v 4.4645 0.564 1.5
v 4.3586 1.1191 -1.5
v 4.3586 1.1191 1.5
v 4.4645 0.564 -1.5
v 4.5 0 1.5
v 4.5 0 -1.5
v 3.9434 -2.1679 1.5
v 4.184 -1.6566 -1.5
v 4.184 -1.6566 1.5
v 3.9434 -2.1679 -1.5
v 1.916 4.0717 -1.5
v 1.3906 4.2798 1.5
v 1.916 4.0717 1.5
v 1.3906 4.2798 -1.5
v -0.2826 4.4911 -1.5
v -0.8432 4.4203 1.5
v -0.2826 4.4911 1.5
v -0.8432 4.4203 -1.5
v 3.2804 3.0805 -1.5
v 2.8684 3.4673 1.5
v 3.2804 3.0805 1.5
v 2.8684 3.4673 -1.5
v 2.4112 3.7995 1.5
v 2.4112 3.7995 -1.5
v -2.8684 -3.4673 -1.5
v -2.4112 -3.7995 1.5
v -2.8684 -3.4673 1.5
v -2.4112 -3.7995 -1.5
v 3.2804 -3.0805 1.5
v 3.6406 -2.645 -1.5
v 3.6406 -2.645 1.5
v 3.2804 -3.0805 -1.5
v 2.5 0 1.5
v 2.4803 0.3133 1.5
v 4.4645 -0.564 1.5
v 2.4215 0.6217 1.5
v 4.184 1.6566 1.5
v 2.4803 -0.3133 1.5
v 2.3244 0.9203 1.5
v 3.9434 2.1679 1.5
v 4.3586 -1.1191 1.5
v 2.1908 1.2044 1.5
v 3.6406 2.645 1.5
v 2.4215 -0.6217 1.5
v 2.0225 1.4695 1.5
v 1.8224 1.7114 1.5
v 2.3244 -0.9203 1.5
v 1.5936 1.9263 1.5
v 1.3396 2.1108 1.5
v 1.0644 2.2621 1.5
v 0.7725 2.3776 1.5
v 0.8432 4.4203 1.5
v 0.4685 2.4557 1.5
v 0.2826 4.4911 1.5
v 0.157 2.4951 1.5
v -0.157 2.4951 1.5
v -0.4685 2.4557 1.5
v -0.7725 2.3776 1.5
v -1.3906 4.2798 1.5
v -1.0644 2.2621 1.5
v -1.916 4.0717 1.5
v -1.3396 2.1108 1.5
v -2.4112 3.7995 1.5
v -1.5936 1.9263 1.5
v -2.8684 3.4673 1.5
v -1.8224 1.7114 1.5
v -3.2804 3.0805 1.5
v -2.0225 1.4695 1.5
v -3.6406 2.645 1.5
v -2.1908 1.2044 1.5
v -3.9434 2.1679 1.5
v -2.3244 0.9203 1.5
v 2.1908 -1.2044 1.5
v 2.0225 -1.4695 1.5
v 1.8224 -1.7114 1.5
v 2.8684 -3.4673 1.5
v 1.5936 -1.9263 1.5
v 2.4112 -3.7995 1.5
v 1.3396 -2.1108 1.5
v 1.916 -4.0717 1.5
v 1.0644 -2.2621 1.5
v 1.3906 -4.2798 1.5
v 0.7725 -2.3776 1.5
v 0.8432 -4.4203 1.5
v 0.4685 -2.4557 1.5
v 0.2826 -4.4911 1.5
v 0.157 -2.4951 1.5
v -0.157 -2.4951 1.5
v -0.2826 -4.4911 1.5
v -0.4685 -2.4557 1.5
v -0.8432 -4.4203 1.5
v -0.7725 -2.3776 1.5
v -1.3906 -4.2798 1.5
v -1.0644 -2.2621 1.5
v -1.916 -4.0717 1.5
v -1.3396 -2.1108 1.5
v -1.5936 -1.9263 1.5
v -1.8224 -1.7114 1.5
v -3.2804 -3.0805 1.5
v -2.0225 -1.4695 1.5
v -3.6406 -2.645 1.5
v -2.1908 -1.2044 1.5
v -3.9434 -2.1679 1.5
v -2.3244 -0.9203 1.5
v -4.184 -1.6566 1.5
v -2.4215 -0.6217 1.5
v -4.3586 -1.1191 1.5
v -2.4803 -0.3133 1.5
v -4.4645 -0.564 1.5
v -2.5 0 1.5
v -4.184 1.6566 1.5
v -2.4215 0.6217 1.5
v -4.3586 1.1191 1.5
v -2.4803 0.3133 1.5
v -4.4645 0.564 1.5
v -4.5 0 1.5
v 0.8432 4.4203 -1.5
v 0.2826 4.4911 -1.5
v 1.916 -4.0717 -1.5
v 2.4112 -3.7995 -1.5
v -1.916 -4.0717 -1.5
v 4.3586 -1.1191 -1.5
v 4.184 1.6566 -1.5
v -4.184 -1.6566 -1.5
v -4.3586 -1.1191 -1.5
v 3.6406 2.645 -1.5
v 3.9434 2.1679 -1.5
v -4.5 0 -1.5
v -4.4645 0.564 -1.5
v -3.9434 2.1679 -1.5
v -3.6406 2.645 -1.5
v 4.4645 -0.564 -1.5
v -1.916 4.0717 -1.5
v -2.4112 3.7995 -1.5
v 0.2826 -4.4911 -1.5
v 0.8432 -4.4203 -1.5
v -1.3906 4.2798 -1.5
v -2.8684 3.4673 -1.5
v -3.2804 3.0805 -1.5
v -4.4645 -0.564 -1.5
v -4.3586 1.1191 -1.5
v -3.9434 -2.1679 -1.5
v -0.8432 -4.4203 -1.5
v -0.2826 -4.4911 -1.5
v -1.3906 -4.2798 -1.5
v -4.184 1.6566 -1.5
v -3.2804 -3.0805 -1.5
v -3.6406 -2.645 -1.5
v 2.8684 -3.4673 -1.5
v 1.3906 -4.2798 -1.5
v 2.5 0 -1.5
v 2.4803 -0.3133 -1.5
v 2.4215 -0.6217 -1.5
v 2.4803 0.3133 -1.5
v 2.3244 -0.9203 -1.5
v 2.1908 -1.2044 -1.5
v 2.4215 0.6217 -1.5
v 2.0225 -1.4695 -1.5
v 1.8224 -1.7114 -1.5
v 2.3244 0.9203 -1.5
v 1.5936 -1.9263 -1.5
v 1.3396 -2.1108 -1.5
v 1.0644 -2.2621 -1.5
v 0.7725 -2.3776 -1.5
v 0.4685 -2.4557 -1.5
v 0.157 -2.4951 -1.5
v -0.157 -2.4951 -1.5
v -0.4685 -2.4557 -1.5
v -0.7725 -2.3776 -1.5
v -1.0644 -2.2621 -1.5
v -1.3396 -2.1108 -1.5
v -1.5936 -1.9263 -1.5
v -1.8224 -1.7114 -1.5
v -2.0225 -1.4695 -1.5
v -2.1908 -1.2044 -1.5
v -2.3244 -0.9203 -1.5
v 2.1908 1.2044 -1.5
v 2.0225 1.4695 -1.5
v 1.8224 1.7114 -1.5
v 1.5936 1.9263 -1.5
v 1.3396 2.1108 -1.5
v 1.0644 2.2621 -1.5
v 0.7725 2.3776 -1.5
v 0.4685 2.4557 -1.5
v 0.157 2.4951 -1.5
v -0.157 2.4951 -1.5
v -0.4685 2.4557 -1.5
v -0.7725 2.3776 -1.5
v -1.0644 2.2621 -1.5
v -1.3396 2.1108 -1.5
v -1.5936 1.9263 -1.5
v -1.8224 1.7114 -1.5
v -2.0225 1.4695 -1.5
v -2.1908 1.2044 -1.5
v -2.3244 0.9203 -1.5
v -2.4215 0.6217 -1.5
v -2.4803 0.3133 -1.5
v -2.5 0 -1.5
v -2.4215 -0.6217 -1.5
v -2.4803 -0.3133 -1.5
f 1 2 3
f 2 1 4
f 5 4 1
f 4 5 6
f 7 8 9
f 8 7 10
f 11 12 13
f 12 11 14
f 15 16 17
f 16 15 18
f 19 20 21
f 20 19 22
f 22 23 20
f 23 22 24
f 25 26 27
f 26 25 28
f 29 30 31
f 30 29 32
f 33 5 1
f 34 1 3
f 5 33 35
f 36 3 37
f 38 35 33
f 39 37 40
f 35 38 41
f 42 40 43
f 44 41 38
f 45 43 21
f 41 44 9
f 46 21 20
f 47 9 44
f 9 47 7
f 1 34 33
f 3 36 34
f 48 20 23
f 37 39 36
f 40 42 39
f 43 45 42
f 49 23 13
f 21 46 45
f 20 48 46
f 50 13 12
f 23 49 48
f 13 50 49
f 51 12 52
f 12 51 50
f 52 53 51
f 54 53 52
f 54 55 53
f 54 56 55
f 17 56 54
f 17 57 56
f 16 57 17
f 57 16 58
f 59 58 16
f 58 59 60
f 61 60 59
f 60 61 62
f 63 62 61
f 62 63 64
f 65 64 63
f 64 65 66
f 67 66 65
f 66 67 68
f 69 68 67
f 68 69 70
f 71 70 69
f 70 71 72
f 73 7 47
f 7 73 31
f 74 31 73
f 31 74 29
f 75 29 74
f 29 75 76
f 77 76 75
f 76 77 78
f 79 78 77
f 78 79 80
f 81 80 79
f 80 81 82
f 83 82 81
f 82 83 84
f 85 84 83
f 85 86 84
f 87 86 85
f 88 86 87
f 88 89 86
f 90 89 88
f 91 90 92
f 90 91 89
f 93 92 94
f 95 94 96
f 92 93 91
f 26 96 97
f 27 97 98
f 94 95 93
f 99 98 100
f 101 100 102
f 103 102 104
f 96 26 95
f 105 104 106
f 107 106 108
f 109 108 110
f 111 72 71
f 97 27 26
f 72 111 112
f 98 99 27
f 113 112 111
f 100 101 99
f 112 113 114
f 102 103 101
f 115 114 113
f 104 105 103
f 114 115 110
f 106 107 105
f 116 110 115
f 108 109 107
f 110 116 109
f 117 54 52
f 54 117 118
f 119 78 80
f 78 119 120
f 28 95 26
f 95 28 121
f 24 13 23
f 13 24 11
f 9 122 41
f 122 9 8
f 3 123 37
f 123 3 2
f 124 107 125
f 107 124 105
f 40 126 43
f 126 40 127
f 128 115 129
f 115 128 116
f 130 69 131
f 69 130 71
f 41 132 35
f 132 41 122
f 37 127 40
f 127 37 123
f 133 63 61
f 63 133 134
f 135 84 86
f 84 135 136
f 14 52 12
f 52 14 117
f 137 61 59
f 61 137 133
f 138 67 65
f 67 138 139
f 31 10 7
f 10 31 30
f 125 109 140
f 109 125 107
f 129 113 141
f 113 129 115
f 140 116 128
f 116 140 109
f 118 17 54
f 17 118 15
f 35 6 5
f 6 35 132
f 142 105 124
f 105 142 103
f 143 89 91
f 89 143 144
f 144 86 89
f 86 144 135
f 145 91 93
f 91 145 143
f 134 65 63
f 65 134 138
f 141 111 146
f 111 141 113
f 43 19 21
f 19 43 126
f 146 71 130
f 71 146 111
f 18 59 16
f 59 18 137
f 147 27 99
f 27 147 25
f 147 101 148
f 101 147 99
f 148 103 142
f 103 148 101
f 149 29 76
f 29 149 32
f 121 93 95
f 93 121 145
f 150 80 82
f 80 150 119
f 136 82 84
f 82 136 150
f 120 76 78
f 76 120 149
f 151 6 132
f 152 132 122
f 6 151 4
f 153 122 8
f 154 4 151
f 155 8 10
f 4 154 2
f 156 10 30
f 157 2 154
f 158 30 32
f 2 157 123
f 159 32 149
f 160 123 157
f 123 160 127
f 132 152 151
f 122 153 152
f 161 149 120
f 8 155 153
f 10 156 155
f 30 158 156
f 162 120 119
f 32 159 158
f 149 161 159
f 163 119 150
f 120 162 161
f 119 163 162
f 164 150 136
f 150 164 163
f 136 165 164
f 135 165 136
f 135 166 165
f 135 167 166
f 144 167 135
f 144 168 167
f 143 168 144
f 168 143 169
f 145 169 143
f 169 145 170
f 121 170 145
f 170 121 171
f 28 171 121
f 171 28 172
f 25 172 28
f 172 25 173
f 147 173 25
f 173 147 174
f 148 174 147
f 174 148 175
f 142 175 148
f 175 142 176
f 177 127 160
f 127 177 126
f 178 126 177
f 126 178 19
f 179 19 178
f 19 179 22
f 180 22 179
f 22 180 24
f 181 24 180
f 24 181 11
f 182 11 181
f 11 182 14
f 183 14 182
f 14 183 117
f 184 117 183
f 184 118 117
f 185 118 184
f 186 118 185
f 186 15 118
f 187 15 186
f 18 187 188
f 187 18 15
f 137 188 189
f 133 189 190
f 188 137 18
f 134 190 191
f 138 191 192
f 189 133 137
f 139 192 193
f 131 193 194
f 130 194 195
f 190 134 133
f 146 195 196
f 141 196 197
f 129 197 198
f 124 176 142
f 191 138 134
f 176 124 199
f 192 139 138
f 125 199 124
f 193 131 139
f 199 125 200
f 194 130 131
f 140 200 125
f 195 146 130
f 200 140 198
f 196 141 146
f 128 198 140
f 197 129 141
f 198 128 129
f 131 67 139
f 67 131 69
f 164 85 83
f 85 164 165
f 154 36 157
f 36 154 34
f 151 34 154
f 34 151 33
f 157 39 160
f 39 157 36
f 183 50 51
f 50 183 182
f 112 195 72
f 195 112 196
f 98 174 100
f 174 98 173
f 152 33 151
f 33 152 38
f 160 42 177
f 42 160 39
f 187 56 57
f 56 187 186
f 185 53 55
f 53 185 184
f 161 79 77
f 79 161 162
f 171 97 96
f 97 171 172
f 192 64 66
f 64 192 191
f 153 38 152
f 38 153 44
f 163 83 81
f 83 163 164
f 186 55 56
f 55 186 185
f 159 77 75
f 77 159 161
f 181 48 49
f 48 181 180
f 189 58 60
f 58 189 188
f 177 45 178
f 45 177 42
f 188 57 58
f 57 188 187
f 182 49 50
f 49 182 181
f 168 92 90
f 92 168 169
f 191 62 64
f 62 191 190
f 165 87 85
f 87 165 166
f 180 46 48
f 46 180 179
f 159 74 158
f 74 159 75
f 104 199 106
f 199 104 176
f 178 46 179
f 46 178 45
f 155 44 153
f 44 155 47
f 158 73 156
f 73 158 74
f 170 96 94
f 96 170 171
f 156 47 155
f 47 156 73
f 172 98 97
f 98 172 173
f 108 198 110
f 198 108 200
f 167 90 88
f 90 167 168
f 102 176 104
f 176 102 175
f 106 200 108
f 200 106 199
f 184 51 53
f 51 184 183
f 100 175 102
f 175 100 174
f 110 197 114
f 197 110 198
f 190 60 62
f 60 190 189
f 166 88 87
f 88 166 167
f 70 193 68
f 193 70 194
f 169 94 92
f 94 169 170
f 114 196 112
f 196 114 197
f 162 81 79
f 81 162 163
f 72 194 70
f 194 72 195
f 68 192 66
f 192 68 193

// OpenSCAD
$fn = 50;


difference() {
	union() {
		translate(v = [0, 0, -1.5000000000]) {
			cylinder(h = 3, r = 4.5000000000);
		}
	}
	union() {
		translate(v = [0, 0, -100.0000000000]) {
			cylinder(h = 200, r = 2.5000000000);
		}
	}
}
